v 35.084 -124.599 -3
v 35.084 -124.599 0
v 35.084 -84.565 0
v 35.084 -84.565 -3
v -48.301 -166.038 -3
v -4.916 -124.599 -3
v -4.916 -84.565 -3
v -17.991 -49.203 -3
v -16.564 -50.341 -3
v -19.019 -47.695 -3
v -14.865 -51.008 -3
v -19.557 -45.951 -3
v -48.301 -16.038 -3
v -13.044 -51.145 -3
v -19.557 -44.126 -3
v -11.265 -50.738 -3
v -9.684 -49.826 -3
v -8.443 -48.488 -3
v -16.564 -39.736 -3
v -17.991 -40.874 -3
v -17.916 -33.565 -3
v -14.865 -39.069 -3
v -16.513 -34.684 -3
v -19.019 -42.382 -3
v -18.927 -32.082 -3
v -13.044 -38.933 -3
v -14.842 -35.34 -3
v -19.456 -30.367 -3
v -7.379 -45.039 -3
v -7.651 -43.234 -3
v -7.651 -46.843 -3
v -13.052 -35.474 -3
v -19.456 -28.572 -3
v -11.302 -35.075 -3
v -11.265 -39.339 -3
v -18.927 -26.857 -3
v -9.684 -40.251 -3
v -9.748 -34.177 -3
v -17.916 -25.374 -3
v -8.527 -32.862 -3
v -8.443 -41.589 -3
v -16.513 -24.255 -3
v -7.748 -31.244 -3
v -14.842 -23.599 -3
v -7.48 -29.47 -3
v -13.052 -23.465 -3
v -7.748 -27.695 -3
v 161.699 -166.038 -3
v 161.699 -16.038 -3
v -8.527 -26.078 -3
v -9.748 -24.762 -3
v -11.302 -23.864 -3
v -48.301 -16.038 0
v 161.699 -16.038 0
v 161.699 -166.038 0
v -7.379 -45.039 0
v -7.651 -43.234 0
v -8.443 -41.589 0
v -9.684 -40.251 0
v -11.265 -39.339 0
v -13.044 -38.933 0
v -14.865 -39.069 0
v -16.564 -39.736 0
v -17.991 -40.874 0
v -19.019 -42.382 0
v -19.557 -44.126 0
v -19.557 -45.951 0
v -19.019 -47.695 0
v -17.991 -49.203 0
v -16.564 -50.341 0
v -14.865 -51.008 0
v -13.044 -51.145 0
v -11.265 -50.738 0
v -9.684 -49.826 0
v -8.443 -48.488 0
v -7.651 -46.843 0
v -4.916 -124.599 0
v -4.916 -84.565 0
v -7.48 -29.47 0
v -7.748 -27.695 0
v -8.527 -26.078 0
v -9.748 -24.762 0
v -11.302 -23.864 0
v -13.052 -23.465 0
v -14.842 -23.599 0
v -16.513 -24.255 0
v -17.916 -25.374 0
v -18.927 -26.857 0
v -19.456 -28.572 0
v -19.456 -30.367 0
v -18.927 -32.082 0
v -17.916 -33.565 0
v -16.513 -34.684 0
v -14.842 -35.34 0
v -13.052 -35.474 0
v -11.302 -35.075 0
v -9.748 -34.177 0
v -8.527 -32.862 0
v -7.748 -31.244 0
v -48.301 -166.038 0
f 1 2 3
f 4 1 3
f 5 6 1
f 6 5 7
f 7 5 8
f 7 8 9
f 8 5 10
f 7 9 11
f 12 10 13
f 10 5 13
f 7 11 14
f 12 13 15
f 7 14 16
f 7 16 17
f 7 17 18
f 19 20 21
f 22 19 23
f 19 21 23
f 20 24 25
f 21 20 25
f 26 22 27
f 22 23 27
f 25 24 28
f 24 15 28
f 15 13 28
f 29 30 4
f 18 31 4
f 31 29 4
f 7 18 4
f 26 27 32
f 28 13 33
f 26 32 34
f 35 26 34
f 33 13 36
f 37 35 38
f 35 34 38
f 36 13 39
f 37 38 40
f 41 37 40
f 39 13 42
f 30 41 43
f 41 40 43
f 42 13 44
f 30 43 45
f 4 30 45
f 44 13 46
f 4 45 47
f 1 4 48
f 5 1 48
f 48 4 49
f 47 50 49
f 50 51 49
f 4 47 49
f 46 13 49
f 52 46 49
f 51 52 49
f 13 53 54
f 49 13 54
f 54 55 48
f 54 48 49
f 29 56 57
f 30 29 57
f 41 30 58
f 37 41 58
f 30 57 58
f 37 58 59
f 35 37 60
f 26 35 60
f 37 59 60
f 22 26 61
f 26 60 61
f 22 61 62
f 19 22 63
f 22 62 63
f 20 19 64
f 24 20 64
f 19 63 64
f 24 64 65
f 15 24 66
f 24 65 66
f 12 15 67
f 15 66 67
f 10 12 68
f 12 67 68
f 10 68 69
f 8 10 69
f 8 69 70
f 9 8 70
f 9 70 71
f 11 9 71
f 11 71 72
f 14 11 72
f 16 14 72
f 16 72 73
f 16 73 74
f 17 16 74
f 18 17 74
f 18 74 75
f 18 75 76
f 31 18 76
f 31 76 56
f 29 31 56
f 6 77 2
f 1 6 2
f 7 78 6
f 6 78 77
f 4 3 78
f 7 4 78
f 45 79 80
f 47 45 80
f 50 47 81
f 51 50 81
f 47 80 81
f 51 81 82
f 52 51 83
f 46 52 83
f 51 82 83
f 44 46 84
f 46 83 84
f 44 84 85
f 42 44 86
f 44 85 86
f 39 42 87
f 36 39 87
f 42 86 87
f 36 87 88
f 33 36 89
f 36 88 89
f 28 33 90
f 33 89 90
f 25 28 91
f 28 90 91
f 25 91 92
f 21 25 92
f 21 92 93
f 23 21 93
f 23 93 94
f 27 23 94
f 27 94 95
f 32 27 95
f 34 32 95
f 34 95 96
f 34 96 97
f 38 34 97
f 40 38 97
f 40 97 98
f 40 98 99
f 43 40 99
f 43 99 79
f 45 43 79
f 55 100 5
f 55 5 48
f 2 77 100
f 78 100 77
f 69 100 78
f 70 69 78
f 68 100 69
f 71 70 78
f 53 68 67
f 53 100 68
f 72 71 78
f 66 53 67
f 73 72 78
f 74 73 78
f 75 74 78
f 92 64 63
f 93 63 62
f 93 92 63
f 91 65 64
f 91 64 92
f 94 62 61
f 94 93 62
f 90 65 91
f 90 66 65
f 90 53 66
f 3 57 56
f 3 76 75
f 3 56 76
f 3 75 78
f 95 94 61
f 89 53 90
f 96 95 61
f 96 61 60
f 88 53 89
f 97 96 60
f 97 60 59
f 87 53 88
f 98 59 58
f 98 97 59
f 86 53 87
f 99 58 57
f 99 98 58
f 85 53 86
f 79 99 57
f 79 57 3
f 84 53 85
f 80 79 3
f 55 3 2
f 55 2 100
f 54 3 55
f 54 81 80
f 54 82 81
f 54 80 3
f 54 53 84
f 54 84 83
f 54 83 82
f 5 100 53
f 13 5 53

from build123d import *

# Parameters (mm, degrees)
SKETCH3_W           = 210
SKETCH3_H           = 150
BOSS_EXTRUDE3_DEPTH = 3
SKETCH4_W           = 40
SKETCH4_H           = 40.033645827
CUT_EXTRUDE2_DEPTH  = 10
SKETCH6_R           = 6.123115527
SKETCH6_R_2         = 6.021528495
CUT_EXTRUDE4_DEPTH  = 10


with BuildPart() as part:
    # Sketch3 → Boss-Extrude3 (new body)
    with BuildSketch(Plane.XY):
        with Locations((56.698645522, -91.038012074)):
            Rectangle(SKETCH3_W, SKETCH3_H)
    extrude(amount=-BOSS_EXTRUDE3_DEPTH)

    # Sketch4 → Cut-Extrude2 (cut)
    with BuildSketch(Plane.XY):
        with Locations((15.083968717, -104.581913211)):
            Rectangle(SKETCH4_W, SKETCH4_H)
    extrude(amount=-CUT_EXTRUDE2_DEPTH, mode=Mode.SUBTRACT)

    # Sketch6 → Cut-Extrude4 (cut)
    with BuildSketch(Plane.XY):
        with Locations((-13.502002571, -45.038518666)):
            Circle(SKETCH6_R)
        with Locations((-13.502002571, -29.469595459)):
            Circle(SKETCH6_R_2)
    extrude(amount=-CUT_EXTRUDE4_DEPTH, mode=Mode.SUBTRACT)


solid = part.part
